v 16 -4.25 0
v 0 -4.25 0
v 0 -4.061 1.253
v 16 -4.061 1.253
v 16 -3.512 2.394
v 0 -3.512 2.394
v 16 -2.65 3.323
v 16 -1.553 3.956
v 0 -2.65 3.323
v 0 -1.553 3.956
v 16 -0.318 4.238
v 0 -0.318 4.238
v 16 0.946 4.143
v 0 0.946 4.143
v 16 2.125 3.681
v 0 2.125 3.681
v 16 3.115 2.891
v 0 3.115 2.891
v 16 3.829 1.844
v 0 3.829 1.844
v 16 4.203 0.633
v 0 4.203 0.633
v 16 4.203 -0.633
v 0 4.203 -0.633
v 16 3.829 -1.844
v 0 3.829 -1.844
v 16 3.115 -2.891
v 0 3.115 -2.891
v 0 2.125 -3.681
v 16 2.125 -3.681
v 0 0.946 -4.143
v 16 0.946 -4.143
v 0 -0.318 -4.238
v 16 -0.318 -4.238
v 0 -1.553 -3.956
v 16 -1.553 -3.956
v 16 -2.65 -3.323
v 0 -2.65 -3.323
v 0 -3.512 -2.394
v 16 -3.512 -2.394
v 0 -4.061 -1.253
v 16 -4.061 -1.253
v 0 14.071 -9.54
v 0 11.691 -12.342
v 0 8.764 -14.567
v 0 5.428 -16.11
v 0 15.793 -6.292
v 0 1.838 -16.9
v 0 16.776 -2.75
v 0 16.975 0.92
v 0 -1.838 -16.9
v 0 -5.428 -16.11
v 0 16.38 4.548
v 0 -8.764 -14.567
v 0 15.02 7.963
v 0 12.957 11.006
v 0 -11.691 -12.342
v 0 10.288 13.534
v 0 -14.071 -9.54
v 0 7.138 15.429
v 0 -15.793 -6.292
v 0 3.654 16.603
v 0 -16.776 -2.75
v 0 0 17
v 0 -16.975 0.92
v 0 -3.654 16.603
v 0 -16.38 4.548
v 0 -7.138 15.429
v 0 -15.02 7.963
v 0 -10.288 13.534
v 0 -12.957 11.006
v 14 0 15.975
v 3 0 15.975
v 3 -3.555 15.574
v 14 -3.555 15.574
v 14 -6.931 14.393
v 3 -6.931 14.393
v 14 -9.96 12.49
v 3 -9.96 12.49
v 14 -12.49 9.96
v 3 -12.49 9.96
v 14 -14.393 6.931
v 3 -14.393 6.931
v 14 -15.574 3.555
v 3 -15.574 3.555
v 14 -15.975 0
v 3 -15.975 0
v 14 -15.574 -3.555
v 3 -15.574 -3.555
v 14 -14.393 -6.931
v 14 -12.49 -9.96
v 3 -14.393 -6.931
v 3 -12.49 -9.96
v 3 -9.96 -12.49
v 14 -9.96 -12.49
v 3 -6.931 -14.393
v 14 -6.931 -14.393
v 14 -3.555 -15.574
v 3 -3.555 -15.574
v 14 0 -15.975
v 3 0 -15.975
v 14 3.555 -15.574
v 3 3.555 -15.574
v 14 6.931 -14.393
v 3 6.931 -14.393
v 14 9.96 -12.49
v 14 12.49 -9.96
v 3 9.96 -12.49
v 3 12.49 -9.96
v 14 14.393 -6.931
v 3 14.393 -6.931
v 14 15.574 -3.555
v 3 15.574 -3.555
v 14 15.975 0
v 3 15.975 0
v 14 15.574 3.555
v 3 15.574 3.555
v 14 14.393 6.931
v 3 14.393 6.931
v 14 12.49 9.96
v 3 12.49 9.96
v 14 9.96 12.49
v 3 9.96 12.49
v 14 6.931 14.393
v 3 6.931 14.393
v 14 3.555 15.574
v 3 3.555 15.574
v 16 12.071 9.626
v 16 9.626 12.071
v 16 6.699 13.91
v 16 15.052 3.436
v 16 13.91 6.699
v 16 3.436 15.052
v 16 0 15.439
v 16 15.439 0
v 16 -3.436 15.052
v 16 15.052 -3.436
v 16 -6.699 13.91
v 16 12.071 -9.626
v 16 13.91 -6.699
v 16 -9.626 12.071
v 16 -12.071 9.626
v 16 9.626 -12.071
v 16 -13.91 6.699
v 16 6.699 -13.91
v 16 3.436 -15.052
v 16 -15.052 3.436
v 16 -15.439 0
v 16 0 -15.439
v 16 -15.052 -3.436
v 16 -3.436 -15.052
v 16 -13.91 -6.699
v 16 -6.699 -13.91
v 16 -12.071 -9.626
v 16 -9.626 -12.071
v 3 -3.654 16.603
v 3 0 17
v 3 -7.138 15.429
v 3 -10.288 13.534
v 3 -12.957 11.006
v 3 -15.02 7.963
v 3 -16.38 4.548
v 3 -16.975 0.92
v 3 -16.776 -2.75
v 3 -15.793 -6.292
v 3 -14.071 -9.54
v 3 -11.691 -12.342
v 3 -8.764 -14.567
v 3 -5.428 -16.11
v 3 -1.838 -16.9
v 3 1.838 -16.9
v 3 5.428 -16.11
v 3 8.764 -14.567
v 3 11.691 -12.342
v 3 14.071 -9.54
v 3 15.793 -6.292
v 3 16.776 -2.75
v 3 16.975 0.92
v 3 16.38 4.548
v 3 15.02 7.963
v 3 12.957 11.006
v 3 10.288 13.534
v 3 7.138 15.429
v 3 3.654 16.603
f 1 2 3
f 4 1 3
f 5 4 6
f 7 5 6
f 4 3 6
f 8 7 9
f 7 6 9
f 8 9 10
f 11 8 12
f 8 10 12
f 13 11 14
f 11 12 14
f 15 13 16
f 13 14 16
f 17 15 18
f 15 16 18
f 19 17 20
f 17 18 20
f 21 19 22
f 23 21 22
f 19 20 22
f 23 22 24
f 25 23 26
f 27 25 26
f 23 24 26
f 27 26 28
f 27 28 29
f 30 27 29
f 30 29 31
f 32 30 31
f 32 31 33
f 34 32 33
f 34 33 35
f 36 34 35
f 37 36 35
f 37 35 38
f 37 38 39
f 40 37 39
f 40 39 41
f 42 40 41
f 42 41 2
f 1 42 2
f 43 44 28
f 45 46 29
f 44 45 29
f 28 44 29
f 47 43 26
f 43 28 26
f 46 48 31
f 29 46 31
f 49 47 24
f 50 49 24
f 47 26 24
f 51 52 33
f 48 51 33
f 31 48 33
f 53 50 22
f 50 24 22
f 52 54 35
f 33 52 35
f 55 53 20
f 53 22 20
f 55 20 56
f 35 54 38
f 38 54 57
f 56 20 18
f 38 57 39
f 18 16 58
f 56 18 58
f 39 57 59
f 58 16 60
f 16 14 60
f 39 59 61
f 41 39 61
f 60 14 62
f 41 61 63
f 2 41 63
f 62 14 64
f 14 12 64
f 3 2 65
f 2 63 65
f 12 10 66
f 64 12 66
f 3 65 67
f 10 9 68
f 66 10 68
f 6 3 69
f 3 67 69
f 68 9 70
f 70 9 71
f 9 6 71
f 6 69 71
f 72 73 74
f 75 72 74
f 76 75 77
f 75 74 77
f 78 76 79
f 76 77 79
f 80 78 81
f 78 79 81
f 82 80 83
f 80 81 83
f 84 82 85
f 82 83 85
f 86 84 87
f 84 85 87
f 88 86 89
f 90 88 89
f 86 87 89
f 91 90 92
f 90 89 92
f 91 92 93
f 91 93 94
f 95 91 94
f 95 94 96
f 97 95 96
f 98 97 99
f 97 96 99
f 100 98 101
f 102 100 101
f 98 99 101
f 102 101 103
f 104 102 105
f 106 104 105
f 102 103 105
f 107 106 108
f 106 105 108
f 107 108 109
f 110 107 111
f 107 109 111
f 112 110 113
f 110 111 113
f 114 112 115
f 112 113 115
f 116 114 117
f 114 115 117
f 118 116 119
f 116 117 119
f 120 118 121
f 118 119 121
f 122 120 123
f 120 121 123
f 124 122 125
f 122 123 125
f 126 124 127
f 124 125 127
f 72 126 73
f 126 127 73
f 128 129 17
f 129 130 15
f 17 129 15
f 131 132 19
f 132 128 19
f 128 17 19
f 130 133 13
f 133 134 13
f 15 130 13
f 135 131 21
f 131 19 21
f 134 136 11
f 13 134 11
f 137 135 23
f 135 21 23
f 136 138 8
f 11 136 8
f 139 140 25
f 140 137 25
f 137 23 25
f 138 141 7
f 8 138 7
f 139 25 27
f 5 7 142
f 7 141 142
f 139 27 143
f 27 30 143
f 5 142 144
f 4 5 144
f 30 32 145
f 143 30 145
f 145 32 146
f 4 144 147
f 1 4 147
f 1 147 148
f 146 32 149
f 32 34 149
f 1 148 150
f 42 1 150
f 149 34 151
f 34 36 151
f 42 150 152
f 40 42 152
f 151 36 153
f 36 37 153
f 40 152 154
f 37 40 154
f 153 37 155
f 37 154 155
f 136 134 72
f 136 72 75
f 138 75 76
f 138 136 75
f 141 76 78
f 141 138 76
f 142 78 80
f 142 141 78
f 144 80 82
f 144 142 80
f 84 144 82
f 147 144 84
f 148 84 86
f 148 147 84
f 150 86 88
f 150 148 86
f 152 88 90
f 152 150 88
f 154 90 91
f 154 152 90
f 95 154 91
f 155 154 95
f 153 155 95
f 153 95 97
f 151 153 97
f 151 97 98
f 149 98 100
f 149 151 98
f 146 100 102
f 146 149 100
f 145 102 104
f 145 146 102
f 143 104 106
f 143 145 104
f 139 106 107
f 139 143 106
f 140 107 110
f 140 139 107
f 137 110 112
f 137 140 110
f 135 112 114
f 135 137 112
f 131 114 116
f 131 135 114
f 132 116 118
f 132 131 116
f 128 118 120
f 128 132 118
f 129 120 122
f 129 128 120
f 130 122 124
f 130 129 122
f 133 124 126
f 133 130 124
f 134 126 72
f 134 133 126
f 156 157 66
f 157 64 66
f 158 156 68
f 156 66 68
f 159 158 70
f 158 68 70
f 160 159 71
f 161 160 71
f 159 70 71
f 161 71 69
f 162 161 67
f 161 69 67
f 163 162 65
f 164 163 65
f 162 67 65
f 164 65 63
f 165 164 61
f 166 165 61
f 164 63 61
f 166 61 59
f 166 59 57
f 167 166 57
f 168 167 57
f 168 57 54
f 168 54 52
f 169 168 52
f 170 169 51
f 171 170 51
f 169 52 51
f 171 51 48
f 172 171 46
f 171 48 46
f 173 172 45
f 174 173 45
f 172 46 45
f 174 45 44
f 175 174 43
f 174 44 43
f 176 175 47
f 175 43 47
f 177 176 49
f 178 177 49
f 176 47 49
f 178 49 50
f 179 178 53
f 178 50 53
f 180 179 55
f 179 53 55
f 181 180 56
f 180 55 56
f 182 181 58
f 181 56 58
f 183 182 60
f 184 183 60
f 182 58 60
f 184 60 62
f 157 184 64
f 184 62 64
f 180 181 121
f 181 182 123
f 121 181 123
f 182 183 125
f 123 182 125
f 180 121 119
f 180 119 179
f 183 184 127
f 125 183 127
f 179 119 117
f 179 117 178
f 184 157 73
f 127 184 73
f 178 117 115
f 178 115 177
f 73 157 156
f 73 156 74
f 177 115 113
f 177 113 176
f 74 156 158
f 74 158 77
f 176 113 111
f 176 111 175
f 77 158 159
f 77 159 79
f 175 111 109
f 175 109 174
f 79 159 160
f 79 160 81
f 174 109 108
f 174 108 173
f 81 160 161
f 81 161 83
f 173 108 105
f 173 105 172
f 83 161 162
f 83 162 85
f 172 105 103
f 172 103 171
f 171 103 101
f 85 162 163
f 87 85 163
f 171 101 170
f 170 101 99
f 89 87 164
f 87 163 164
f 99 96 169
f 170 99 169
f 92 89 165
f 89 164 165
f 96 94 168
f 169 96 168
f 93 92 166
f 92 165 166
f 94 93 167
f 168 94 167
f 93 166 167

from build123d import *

# Parameters (mm, degrees)
F3_D     = 8.5
F4_SIZE2 = 0.5358983849
F4_SIZE  = 2


with BuildPart() as f1:
    # F0 (on Front) → F1 (revolve)
    with BuildSketch(Plane.XZ):
        Polygon((0, 17), (0, 0), (16, 0), (16, 15.975), (3, 15.975), (3, 17), align=None)
    revolve(axis=Axis((8, 0, 0), (1, 0, 0)))

    # F3 (through all)
    with Locations(Plane.YZ.offset(16)):
        with Locations((0, 0)):
            Hole(F3_D / 2)

    # F4
    f4_edges = [f1.edges().sort_by_distance(p)[0] for p in [
        (16, 0, -15.975),
    ]]
    f4_side = f1.faces().sort_by_distance((9.5, 0, -15.975))[0]
    chamfer(f4_edges, length=F4_SIZE, length2=F4_SIZE2, reference=f4_side)


solid = f1.part
